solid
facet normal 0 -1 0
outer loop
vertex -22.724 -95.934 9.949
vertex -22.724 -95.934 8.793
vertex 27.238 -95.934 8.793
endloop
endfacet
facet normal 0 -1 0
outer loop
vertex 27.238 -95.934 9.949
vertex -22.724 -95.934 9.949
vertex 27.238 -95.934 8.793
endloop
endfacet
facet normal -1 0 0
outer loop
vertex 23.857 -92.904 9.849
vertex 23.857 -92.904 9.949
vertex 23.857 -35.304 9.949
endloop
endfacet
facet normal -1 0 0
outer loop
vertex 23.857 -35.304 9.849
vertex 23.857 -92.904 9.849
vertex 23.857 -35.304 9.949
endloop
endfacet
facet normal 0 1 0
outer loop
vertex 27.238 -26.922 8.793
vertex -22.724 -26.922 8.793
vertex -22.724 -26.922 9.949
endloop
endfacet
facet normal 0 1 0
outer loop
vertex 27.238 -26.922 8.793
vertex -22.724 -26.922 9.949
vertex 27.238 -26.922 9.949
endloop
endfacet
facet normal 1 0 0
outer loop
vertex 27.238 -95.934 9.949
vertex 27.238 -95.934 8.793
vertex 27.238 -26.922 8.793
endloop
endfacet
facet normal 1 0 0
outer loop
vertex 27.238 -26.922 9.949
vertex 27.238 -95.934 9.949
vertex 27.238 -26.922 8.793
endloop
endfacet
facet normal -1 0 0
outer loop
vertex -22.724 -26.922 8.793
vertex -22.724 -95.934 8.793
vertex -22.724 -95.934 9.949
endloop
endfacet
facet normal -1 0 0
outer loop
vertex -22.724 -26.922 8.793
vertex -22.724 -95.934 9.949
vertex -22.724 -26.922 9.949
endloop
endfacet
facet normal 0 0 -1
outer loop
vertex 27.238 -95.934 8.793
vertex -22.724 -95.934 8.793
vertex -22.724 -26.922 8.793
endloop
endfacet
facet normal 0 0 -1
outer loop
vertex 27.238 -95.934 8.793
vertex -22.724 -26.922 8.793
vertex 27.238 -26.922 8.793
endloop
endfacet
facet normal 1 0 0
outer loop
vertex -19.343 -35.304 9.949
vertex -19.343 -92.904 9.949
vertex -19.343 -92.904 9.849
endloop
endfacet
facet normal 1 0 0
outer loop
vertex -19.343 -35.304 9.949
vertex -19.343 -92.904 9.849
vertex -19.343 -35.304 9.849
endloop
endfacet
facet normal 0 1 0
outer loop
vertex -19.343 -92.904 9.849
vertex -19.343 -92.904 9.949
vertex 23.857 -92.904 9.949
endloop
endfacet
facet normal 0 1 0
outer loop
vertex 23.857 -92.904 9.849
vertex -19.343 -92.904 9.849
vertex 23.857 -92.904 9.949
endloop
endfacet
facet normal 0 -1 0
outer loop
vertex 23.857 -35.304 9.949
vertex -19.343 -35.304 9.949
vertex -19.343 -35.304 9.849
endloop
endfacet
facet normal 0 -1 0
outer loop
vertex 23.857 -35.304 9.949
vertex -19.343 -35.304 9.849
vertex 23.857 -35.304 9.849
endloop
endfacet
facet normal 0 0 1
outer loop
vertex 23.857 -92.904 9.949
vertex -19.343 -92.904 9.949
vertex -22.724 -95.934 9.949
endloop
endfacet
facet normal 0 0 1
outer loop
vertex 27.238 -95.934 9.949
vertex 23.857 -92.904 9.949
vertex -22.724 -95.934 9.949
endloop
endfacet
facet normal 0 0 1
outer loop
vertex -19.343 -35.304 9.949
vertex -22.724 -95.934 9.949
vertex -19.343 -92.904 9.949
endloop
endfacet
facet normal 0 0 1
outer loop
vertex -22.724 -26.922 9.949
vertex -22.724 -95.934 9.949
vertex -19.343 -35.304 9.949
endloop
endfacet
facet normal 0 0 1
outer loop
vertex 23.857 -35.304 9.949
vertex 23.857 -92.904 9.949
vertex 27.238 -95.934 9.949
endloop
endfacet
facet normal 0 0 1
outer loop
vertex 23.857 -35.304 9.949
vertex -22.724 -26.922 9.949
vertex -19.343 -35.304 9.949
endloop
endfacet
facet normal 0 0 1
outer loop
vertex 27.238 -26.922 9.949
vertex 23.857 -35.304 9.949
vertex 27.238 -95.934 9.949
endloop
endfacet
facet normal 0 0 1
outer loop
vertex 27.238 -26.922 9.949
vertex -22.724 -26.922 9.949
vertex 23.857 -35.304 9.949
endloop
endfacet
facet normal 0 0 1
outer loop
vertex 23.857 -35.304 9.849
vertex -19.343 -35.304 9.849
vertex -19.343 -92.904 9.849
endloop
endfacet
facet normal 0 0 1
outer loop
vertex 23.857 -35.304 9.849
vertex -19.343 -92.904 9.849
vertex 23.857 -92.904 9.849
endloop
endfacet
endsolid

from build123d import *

# Parameters (mm, degrees)
SKETCH1_W           = 49.9618
SKETCH1_H           = 69.0118
BOSS_EXTRUDE1_DEPTH = 1.1566
SKETCH3_W           = 43.199747393
SKETCH3_H           = 57.599795215
CUT_EXTRUDE1_DEPTH  = 0.1


with BuildPart() as part:
    # Sketch1 → Boss-Extrude1 (new body)
    with BuildSketch(Plane.XY.offset(8.79254995)):
        with Locations((2.257083431, -61.428094771)):
            Rectangle(SKETCH1_W, SKETCH1_H)
    extrude(amount=BOSS_EXTRUDE1_DEPTH)

    # Sketch3 → Cut-Extrude1 (cut)
    with BuildSketch(Plane.XY.offset(9.94914995)):
        with Locations((2.256996925, -64.104049821)):
            Rectangle(SKETCH3_W, SKETCH3_H)
    extrude(amount=-CUT_EXTRUDE1_DEPTH, mode=Mode.SUBTRACT)


solid = part.part
